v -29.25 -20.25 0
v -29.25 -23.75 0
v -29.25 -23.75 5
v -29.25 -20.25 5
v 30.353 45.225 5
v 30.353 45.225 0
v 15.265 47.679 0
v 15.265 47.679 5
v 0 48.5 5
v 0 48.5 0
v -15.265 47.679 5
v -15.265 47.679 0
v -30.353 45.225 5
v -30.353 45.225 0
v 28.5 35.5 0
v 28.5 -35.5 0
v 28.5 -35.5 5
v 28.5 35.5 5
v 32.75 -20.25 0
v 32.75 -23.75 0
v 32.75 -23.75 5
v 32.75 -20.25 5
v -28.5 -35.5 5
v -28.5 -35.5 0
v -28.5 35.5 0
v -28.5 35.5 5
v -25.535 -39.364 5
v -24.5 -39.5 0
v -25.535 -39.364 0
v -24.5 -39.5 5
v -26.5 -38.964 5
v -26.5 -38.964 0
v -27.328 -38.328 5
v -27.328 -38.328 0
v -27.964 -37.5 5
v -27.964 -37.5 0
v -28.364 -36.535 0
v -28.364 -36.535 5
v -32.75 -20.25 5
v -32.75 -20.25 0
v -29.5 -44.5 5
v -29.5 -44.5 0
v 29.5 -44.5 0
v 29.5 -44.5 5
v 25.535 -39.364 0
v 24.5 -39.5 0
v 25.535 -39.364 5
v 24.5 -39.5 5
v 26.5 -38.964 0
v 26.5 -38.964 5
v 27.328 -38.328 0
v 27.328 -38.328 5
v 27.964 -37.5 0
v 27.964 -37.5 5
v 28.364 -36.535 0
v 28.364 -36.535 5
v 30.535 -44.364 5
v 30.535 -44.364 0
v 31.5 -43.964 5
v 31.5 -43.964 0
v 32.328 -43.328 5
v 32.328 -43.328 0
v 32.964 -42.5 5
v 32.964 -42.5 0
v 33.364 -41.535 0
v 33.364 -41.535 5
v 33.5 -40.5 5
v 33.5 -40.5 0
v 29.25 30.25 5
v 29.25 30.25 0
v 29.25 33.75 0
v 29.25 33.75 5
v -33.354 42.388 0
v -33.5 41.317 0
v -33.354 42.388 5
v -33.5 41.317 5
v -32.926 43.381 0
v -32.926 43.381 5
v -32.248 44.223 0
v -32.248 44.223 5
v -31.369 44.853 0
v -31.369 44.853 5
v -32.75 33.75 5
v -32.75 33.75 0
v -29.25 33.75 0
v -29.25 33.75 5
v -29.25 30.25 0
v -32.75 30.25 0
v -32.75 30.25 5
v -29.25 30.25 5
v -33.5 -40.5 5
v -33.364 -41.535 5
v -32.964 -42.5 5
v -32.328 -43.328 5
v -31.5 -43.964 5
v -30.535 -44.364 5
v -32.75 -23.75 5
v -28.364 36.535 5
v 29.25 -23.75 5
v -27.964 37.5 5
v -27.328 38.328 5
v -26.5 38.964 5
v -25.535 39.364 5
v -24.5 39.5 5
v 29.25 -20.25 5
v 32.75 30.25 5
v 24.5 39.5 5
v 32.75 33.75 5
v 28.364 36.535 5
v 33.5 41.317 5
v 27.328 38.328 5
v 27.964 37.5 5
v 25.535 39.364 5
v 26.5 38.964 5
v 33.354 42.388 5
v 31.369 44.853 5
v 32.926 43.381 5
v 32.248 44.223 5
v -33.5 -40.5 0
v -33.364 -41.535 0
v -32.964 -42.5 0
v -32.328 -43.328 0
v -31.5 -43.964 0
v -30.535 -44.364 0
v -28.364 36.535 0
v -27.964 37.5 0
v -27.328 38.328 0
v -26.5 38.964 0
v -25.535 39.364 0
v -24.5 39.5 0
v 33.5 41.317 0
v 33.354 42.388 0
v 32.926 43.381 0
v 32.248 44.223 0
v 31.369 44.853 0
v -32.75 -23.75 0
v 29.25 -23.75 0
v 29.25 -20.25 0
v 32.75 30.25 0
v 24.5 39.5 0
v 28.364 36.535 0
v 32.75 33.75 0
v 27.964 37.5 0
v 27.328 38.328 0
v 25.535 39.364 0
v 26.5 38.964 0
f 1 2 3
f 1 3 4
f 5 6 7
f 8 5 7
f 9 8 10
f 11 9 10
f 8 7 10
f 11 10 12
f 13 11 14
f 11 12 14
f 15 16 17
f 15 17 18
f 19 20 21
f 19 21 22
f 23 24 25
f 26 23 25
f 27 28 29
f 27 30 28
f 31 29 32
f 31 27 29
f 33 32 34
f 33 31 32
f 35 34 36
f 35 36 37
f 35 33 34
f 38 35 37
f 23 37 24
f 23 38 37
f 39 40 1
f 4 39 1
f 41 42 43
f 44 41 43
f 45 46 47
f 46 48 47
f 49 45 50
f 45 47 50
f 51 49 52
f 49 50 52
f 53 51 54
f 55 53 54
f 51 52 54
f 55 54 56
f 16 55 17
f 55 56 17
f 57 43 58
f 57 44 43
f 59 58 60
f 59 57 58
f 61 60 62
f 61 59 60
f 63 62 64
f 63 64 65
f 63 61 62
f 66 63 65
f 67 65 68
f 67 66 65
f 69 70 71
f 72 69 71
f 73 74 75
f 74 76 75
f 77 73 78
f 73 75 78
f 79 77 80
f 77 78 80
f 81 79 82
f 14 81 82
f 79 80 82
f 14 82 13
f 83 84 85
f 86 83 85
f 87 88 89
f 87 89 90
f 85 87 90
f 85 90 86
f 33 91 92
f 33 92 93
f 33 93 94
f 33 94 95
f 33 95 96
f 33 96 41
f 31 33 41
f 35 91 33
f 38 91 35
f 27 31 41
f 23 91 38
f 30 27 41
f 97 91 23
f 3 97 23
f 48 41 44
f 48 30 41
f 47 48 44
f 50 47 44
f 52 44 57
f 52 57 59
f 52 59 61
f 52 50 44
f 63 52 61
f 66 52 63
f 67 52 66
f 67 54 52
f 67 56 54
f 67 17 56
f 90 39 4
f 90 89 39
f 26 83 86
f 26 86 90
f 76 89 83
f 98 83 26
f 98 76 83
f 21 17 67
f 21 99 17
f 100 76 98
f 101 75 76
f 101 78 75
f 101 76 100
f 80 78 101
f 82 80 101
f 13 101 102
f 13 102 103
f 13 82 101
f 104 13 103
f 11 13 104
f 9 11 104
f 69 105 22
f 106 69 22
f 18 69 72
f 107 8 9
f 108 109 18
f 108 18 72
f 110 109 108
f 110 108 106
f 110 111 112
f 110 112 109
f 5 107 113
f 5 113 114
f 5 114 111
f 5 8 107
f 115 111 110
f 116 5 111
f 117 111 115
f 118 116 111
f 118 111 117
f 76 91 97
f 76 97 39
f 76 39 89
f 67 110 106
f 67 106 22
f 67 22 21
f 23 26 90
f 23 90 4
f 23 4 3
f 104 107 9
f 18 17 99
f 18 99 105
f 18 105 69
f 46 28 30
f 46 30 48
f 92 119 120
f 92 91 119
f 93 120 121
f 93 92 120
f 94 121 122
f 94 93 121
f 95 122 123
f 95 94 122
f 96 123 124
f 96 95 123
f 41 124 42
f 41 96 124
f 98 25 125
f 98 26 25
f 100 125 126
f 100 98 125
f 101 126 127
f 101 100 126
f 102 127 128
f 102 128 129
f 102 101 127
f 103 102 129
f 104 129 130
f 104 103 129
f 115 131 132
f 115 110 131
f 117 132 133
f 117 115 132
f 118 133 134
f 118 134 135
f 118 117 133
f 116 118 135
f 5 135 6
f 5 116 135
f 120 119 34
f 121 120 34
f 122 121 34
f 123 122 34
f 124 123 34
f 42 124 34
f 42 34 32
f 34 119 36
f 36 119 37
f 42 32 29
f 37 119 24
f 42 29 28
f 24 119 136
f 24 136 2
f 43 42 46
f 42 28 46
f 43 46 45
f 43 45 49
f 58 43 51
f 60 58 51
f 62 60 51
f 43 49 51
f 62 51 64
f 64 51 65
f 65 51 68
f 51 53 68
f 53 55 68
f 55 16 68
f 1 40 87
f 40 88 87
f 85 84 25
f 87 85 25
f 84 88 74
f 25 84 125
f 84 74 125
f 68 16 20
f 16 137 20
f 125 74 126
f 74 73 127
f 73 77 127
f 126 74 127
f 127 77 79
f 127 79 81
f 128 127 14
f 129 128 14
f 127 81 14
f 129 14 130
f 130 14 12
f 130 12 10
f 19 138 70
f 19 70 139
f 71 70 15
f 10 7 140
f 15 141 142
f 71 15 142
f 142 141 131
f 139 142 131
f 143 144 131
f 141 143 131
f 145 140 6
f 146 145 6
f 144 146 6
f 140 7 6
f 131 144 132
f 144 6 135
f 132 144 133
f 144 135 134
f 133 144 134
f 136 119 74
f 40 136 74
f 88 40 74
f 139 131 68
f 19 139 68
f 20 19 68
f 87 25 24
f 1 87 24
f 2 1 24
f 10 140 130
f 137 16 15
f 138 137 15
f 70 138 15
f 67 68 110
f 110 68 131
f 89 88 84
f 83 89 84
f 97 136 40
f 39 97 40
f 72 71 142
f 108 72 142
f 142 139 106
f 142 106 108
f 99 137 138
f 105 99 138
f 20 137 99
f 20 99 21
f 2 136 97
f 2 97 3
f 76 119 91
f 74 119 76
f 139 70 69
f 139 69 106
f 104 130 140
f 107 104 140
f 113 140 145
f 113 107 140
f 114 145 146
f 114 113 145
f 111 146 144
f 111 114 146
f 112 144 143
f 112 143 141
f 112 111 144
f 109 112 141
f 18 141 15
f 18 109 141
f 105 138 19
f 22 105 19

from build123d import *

# Parameters (mm, degrees)
F0_W     = 67
F0_H     = 89
F0_W_2   = 3.5
F0_H_2   = 3.5
F0_W_3   = 57
F0_H_3   = 79
F1_DEPTH = 5
F2_R     = 4


with BuildPart() as f1:
    # F0 (on Top) → F1 (new body)
    with BuildSketch(Plane.XY):
        Rectangle(F0_W, F0_H)
        with Locations((-31, -22)):
            Rectangle(F0_W_2, F0_H_2, mode=Mode.SUBTRACT)
        with Locations((31, -22)):
            Rectangle(F0_W_2, F0_H_2, mode=Mode.SUBTRACT)
        Rectangle(F0_W_3, F0_H_3, mode=Mode.SUBTRACT)
        with Locations((-31, 32)):
            Rectangle(F0_W_2, F0_H_2, mode=Mode.SUBTRACT)
        with Locations((31, 32)):
            Rectangle(F0_W_2, F0_H_2, mode=Mode.SUBTRACT)
        with BuildLine():
            Line((-33.5, 44.5), (33.5, 44.5))
            ThreePointArc((33.5, 44.5), (0, 48.5), (-33.5, 44.5))
        make_face()
    extrude(amount=F1_DEPTH)

    # F2
    f2_edges = [f1.edges().sort_by_distance(p)[0] for p in [
        (-33.5, -44.5, 2.5),
        (33.5, -44.5, 2.5),
        (-33.5, 44.5, 2.5),
        (33.5, 44.5, 2.5),
        (-28.5, 39.5, 2.5),
        (28.5, 39.5, 2.5),
        (28.5, -39.5, 2.5),
        (-28.5, -39.5, 2.5),
    ]]
    fillet(f2_edges, radius=F2_R)


solid = f1.part
